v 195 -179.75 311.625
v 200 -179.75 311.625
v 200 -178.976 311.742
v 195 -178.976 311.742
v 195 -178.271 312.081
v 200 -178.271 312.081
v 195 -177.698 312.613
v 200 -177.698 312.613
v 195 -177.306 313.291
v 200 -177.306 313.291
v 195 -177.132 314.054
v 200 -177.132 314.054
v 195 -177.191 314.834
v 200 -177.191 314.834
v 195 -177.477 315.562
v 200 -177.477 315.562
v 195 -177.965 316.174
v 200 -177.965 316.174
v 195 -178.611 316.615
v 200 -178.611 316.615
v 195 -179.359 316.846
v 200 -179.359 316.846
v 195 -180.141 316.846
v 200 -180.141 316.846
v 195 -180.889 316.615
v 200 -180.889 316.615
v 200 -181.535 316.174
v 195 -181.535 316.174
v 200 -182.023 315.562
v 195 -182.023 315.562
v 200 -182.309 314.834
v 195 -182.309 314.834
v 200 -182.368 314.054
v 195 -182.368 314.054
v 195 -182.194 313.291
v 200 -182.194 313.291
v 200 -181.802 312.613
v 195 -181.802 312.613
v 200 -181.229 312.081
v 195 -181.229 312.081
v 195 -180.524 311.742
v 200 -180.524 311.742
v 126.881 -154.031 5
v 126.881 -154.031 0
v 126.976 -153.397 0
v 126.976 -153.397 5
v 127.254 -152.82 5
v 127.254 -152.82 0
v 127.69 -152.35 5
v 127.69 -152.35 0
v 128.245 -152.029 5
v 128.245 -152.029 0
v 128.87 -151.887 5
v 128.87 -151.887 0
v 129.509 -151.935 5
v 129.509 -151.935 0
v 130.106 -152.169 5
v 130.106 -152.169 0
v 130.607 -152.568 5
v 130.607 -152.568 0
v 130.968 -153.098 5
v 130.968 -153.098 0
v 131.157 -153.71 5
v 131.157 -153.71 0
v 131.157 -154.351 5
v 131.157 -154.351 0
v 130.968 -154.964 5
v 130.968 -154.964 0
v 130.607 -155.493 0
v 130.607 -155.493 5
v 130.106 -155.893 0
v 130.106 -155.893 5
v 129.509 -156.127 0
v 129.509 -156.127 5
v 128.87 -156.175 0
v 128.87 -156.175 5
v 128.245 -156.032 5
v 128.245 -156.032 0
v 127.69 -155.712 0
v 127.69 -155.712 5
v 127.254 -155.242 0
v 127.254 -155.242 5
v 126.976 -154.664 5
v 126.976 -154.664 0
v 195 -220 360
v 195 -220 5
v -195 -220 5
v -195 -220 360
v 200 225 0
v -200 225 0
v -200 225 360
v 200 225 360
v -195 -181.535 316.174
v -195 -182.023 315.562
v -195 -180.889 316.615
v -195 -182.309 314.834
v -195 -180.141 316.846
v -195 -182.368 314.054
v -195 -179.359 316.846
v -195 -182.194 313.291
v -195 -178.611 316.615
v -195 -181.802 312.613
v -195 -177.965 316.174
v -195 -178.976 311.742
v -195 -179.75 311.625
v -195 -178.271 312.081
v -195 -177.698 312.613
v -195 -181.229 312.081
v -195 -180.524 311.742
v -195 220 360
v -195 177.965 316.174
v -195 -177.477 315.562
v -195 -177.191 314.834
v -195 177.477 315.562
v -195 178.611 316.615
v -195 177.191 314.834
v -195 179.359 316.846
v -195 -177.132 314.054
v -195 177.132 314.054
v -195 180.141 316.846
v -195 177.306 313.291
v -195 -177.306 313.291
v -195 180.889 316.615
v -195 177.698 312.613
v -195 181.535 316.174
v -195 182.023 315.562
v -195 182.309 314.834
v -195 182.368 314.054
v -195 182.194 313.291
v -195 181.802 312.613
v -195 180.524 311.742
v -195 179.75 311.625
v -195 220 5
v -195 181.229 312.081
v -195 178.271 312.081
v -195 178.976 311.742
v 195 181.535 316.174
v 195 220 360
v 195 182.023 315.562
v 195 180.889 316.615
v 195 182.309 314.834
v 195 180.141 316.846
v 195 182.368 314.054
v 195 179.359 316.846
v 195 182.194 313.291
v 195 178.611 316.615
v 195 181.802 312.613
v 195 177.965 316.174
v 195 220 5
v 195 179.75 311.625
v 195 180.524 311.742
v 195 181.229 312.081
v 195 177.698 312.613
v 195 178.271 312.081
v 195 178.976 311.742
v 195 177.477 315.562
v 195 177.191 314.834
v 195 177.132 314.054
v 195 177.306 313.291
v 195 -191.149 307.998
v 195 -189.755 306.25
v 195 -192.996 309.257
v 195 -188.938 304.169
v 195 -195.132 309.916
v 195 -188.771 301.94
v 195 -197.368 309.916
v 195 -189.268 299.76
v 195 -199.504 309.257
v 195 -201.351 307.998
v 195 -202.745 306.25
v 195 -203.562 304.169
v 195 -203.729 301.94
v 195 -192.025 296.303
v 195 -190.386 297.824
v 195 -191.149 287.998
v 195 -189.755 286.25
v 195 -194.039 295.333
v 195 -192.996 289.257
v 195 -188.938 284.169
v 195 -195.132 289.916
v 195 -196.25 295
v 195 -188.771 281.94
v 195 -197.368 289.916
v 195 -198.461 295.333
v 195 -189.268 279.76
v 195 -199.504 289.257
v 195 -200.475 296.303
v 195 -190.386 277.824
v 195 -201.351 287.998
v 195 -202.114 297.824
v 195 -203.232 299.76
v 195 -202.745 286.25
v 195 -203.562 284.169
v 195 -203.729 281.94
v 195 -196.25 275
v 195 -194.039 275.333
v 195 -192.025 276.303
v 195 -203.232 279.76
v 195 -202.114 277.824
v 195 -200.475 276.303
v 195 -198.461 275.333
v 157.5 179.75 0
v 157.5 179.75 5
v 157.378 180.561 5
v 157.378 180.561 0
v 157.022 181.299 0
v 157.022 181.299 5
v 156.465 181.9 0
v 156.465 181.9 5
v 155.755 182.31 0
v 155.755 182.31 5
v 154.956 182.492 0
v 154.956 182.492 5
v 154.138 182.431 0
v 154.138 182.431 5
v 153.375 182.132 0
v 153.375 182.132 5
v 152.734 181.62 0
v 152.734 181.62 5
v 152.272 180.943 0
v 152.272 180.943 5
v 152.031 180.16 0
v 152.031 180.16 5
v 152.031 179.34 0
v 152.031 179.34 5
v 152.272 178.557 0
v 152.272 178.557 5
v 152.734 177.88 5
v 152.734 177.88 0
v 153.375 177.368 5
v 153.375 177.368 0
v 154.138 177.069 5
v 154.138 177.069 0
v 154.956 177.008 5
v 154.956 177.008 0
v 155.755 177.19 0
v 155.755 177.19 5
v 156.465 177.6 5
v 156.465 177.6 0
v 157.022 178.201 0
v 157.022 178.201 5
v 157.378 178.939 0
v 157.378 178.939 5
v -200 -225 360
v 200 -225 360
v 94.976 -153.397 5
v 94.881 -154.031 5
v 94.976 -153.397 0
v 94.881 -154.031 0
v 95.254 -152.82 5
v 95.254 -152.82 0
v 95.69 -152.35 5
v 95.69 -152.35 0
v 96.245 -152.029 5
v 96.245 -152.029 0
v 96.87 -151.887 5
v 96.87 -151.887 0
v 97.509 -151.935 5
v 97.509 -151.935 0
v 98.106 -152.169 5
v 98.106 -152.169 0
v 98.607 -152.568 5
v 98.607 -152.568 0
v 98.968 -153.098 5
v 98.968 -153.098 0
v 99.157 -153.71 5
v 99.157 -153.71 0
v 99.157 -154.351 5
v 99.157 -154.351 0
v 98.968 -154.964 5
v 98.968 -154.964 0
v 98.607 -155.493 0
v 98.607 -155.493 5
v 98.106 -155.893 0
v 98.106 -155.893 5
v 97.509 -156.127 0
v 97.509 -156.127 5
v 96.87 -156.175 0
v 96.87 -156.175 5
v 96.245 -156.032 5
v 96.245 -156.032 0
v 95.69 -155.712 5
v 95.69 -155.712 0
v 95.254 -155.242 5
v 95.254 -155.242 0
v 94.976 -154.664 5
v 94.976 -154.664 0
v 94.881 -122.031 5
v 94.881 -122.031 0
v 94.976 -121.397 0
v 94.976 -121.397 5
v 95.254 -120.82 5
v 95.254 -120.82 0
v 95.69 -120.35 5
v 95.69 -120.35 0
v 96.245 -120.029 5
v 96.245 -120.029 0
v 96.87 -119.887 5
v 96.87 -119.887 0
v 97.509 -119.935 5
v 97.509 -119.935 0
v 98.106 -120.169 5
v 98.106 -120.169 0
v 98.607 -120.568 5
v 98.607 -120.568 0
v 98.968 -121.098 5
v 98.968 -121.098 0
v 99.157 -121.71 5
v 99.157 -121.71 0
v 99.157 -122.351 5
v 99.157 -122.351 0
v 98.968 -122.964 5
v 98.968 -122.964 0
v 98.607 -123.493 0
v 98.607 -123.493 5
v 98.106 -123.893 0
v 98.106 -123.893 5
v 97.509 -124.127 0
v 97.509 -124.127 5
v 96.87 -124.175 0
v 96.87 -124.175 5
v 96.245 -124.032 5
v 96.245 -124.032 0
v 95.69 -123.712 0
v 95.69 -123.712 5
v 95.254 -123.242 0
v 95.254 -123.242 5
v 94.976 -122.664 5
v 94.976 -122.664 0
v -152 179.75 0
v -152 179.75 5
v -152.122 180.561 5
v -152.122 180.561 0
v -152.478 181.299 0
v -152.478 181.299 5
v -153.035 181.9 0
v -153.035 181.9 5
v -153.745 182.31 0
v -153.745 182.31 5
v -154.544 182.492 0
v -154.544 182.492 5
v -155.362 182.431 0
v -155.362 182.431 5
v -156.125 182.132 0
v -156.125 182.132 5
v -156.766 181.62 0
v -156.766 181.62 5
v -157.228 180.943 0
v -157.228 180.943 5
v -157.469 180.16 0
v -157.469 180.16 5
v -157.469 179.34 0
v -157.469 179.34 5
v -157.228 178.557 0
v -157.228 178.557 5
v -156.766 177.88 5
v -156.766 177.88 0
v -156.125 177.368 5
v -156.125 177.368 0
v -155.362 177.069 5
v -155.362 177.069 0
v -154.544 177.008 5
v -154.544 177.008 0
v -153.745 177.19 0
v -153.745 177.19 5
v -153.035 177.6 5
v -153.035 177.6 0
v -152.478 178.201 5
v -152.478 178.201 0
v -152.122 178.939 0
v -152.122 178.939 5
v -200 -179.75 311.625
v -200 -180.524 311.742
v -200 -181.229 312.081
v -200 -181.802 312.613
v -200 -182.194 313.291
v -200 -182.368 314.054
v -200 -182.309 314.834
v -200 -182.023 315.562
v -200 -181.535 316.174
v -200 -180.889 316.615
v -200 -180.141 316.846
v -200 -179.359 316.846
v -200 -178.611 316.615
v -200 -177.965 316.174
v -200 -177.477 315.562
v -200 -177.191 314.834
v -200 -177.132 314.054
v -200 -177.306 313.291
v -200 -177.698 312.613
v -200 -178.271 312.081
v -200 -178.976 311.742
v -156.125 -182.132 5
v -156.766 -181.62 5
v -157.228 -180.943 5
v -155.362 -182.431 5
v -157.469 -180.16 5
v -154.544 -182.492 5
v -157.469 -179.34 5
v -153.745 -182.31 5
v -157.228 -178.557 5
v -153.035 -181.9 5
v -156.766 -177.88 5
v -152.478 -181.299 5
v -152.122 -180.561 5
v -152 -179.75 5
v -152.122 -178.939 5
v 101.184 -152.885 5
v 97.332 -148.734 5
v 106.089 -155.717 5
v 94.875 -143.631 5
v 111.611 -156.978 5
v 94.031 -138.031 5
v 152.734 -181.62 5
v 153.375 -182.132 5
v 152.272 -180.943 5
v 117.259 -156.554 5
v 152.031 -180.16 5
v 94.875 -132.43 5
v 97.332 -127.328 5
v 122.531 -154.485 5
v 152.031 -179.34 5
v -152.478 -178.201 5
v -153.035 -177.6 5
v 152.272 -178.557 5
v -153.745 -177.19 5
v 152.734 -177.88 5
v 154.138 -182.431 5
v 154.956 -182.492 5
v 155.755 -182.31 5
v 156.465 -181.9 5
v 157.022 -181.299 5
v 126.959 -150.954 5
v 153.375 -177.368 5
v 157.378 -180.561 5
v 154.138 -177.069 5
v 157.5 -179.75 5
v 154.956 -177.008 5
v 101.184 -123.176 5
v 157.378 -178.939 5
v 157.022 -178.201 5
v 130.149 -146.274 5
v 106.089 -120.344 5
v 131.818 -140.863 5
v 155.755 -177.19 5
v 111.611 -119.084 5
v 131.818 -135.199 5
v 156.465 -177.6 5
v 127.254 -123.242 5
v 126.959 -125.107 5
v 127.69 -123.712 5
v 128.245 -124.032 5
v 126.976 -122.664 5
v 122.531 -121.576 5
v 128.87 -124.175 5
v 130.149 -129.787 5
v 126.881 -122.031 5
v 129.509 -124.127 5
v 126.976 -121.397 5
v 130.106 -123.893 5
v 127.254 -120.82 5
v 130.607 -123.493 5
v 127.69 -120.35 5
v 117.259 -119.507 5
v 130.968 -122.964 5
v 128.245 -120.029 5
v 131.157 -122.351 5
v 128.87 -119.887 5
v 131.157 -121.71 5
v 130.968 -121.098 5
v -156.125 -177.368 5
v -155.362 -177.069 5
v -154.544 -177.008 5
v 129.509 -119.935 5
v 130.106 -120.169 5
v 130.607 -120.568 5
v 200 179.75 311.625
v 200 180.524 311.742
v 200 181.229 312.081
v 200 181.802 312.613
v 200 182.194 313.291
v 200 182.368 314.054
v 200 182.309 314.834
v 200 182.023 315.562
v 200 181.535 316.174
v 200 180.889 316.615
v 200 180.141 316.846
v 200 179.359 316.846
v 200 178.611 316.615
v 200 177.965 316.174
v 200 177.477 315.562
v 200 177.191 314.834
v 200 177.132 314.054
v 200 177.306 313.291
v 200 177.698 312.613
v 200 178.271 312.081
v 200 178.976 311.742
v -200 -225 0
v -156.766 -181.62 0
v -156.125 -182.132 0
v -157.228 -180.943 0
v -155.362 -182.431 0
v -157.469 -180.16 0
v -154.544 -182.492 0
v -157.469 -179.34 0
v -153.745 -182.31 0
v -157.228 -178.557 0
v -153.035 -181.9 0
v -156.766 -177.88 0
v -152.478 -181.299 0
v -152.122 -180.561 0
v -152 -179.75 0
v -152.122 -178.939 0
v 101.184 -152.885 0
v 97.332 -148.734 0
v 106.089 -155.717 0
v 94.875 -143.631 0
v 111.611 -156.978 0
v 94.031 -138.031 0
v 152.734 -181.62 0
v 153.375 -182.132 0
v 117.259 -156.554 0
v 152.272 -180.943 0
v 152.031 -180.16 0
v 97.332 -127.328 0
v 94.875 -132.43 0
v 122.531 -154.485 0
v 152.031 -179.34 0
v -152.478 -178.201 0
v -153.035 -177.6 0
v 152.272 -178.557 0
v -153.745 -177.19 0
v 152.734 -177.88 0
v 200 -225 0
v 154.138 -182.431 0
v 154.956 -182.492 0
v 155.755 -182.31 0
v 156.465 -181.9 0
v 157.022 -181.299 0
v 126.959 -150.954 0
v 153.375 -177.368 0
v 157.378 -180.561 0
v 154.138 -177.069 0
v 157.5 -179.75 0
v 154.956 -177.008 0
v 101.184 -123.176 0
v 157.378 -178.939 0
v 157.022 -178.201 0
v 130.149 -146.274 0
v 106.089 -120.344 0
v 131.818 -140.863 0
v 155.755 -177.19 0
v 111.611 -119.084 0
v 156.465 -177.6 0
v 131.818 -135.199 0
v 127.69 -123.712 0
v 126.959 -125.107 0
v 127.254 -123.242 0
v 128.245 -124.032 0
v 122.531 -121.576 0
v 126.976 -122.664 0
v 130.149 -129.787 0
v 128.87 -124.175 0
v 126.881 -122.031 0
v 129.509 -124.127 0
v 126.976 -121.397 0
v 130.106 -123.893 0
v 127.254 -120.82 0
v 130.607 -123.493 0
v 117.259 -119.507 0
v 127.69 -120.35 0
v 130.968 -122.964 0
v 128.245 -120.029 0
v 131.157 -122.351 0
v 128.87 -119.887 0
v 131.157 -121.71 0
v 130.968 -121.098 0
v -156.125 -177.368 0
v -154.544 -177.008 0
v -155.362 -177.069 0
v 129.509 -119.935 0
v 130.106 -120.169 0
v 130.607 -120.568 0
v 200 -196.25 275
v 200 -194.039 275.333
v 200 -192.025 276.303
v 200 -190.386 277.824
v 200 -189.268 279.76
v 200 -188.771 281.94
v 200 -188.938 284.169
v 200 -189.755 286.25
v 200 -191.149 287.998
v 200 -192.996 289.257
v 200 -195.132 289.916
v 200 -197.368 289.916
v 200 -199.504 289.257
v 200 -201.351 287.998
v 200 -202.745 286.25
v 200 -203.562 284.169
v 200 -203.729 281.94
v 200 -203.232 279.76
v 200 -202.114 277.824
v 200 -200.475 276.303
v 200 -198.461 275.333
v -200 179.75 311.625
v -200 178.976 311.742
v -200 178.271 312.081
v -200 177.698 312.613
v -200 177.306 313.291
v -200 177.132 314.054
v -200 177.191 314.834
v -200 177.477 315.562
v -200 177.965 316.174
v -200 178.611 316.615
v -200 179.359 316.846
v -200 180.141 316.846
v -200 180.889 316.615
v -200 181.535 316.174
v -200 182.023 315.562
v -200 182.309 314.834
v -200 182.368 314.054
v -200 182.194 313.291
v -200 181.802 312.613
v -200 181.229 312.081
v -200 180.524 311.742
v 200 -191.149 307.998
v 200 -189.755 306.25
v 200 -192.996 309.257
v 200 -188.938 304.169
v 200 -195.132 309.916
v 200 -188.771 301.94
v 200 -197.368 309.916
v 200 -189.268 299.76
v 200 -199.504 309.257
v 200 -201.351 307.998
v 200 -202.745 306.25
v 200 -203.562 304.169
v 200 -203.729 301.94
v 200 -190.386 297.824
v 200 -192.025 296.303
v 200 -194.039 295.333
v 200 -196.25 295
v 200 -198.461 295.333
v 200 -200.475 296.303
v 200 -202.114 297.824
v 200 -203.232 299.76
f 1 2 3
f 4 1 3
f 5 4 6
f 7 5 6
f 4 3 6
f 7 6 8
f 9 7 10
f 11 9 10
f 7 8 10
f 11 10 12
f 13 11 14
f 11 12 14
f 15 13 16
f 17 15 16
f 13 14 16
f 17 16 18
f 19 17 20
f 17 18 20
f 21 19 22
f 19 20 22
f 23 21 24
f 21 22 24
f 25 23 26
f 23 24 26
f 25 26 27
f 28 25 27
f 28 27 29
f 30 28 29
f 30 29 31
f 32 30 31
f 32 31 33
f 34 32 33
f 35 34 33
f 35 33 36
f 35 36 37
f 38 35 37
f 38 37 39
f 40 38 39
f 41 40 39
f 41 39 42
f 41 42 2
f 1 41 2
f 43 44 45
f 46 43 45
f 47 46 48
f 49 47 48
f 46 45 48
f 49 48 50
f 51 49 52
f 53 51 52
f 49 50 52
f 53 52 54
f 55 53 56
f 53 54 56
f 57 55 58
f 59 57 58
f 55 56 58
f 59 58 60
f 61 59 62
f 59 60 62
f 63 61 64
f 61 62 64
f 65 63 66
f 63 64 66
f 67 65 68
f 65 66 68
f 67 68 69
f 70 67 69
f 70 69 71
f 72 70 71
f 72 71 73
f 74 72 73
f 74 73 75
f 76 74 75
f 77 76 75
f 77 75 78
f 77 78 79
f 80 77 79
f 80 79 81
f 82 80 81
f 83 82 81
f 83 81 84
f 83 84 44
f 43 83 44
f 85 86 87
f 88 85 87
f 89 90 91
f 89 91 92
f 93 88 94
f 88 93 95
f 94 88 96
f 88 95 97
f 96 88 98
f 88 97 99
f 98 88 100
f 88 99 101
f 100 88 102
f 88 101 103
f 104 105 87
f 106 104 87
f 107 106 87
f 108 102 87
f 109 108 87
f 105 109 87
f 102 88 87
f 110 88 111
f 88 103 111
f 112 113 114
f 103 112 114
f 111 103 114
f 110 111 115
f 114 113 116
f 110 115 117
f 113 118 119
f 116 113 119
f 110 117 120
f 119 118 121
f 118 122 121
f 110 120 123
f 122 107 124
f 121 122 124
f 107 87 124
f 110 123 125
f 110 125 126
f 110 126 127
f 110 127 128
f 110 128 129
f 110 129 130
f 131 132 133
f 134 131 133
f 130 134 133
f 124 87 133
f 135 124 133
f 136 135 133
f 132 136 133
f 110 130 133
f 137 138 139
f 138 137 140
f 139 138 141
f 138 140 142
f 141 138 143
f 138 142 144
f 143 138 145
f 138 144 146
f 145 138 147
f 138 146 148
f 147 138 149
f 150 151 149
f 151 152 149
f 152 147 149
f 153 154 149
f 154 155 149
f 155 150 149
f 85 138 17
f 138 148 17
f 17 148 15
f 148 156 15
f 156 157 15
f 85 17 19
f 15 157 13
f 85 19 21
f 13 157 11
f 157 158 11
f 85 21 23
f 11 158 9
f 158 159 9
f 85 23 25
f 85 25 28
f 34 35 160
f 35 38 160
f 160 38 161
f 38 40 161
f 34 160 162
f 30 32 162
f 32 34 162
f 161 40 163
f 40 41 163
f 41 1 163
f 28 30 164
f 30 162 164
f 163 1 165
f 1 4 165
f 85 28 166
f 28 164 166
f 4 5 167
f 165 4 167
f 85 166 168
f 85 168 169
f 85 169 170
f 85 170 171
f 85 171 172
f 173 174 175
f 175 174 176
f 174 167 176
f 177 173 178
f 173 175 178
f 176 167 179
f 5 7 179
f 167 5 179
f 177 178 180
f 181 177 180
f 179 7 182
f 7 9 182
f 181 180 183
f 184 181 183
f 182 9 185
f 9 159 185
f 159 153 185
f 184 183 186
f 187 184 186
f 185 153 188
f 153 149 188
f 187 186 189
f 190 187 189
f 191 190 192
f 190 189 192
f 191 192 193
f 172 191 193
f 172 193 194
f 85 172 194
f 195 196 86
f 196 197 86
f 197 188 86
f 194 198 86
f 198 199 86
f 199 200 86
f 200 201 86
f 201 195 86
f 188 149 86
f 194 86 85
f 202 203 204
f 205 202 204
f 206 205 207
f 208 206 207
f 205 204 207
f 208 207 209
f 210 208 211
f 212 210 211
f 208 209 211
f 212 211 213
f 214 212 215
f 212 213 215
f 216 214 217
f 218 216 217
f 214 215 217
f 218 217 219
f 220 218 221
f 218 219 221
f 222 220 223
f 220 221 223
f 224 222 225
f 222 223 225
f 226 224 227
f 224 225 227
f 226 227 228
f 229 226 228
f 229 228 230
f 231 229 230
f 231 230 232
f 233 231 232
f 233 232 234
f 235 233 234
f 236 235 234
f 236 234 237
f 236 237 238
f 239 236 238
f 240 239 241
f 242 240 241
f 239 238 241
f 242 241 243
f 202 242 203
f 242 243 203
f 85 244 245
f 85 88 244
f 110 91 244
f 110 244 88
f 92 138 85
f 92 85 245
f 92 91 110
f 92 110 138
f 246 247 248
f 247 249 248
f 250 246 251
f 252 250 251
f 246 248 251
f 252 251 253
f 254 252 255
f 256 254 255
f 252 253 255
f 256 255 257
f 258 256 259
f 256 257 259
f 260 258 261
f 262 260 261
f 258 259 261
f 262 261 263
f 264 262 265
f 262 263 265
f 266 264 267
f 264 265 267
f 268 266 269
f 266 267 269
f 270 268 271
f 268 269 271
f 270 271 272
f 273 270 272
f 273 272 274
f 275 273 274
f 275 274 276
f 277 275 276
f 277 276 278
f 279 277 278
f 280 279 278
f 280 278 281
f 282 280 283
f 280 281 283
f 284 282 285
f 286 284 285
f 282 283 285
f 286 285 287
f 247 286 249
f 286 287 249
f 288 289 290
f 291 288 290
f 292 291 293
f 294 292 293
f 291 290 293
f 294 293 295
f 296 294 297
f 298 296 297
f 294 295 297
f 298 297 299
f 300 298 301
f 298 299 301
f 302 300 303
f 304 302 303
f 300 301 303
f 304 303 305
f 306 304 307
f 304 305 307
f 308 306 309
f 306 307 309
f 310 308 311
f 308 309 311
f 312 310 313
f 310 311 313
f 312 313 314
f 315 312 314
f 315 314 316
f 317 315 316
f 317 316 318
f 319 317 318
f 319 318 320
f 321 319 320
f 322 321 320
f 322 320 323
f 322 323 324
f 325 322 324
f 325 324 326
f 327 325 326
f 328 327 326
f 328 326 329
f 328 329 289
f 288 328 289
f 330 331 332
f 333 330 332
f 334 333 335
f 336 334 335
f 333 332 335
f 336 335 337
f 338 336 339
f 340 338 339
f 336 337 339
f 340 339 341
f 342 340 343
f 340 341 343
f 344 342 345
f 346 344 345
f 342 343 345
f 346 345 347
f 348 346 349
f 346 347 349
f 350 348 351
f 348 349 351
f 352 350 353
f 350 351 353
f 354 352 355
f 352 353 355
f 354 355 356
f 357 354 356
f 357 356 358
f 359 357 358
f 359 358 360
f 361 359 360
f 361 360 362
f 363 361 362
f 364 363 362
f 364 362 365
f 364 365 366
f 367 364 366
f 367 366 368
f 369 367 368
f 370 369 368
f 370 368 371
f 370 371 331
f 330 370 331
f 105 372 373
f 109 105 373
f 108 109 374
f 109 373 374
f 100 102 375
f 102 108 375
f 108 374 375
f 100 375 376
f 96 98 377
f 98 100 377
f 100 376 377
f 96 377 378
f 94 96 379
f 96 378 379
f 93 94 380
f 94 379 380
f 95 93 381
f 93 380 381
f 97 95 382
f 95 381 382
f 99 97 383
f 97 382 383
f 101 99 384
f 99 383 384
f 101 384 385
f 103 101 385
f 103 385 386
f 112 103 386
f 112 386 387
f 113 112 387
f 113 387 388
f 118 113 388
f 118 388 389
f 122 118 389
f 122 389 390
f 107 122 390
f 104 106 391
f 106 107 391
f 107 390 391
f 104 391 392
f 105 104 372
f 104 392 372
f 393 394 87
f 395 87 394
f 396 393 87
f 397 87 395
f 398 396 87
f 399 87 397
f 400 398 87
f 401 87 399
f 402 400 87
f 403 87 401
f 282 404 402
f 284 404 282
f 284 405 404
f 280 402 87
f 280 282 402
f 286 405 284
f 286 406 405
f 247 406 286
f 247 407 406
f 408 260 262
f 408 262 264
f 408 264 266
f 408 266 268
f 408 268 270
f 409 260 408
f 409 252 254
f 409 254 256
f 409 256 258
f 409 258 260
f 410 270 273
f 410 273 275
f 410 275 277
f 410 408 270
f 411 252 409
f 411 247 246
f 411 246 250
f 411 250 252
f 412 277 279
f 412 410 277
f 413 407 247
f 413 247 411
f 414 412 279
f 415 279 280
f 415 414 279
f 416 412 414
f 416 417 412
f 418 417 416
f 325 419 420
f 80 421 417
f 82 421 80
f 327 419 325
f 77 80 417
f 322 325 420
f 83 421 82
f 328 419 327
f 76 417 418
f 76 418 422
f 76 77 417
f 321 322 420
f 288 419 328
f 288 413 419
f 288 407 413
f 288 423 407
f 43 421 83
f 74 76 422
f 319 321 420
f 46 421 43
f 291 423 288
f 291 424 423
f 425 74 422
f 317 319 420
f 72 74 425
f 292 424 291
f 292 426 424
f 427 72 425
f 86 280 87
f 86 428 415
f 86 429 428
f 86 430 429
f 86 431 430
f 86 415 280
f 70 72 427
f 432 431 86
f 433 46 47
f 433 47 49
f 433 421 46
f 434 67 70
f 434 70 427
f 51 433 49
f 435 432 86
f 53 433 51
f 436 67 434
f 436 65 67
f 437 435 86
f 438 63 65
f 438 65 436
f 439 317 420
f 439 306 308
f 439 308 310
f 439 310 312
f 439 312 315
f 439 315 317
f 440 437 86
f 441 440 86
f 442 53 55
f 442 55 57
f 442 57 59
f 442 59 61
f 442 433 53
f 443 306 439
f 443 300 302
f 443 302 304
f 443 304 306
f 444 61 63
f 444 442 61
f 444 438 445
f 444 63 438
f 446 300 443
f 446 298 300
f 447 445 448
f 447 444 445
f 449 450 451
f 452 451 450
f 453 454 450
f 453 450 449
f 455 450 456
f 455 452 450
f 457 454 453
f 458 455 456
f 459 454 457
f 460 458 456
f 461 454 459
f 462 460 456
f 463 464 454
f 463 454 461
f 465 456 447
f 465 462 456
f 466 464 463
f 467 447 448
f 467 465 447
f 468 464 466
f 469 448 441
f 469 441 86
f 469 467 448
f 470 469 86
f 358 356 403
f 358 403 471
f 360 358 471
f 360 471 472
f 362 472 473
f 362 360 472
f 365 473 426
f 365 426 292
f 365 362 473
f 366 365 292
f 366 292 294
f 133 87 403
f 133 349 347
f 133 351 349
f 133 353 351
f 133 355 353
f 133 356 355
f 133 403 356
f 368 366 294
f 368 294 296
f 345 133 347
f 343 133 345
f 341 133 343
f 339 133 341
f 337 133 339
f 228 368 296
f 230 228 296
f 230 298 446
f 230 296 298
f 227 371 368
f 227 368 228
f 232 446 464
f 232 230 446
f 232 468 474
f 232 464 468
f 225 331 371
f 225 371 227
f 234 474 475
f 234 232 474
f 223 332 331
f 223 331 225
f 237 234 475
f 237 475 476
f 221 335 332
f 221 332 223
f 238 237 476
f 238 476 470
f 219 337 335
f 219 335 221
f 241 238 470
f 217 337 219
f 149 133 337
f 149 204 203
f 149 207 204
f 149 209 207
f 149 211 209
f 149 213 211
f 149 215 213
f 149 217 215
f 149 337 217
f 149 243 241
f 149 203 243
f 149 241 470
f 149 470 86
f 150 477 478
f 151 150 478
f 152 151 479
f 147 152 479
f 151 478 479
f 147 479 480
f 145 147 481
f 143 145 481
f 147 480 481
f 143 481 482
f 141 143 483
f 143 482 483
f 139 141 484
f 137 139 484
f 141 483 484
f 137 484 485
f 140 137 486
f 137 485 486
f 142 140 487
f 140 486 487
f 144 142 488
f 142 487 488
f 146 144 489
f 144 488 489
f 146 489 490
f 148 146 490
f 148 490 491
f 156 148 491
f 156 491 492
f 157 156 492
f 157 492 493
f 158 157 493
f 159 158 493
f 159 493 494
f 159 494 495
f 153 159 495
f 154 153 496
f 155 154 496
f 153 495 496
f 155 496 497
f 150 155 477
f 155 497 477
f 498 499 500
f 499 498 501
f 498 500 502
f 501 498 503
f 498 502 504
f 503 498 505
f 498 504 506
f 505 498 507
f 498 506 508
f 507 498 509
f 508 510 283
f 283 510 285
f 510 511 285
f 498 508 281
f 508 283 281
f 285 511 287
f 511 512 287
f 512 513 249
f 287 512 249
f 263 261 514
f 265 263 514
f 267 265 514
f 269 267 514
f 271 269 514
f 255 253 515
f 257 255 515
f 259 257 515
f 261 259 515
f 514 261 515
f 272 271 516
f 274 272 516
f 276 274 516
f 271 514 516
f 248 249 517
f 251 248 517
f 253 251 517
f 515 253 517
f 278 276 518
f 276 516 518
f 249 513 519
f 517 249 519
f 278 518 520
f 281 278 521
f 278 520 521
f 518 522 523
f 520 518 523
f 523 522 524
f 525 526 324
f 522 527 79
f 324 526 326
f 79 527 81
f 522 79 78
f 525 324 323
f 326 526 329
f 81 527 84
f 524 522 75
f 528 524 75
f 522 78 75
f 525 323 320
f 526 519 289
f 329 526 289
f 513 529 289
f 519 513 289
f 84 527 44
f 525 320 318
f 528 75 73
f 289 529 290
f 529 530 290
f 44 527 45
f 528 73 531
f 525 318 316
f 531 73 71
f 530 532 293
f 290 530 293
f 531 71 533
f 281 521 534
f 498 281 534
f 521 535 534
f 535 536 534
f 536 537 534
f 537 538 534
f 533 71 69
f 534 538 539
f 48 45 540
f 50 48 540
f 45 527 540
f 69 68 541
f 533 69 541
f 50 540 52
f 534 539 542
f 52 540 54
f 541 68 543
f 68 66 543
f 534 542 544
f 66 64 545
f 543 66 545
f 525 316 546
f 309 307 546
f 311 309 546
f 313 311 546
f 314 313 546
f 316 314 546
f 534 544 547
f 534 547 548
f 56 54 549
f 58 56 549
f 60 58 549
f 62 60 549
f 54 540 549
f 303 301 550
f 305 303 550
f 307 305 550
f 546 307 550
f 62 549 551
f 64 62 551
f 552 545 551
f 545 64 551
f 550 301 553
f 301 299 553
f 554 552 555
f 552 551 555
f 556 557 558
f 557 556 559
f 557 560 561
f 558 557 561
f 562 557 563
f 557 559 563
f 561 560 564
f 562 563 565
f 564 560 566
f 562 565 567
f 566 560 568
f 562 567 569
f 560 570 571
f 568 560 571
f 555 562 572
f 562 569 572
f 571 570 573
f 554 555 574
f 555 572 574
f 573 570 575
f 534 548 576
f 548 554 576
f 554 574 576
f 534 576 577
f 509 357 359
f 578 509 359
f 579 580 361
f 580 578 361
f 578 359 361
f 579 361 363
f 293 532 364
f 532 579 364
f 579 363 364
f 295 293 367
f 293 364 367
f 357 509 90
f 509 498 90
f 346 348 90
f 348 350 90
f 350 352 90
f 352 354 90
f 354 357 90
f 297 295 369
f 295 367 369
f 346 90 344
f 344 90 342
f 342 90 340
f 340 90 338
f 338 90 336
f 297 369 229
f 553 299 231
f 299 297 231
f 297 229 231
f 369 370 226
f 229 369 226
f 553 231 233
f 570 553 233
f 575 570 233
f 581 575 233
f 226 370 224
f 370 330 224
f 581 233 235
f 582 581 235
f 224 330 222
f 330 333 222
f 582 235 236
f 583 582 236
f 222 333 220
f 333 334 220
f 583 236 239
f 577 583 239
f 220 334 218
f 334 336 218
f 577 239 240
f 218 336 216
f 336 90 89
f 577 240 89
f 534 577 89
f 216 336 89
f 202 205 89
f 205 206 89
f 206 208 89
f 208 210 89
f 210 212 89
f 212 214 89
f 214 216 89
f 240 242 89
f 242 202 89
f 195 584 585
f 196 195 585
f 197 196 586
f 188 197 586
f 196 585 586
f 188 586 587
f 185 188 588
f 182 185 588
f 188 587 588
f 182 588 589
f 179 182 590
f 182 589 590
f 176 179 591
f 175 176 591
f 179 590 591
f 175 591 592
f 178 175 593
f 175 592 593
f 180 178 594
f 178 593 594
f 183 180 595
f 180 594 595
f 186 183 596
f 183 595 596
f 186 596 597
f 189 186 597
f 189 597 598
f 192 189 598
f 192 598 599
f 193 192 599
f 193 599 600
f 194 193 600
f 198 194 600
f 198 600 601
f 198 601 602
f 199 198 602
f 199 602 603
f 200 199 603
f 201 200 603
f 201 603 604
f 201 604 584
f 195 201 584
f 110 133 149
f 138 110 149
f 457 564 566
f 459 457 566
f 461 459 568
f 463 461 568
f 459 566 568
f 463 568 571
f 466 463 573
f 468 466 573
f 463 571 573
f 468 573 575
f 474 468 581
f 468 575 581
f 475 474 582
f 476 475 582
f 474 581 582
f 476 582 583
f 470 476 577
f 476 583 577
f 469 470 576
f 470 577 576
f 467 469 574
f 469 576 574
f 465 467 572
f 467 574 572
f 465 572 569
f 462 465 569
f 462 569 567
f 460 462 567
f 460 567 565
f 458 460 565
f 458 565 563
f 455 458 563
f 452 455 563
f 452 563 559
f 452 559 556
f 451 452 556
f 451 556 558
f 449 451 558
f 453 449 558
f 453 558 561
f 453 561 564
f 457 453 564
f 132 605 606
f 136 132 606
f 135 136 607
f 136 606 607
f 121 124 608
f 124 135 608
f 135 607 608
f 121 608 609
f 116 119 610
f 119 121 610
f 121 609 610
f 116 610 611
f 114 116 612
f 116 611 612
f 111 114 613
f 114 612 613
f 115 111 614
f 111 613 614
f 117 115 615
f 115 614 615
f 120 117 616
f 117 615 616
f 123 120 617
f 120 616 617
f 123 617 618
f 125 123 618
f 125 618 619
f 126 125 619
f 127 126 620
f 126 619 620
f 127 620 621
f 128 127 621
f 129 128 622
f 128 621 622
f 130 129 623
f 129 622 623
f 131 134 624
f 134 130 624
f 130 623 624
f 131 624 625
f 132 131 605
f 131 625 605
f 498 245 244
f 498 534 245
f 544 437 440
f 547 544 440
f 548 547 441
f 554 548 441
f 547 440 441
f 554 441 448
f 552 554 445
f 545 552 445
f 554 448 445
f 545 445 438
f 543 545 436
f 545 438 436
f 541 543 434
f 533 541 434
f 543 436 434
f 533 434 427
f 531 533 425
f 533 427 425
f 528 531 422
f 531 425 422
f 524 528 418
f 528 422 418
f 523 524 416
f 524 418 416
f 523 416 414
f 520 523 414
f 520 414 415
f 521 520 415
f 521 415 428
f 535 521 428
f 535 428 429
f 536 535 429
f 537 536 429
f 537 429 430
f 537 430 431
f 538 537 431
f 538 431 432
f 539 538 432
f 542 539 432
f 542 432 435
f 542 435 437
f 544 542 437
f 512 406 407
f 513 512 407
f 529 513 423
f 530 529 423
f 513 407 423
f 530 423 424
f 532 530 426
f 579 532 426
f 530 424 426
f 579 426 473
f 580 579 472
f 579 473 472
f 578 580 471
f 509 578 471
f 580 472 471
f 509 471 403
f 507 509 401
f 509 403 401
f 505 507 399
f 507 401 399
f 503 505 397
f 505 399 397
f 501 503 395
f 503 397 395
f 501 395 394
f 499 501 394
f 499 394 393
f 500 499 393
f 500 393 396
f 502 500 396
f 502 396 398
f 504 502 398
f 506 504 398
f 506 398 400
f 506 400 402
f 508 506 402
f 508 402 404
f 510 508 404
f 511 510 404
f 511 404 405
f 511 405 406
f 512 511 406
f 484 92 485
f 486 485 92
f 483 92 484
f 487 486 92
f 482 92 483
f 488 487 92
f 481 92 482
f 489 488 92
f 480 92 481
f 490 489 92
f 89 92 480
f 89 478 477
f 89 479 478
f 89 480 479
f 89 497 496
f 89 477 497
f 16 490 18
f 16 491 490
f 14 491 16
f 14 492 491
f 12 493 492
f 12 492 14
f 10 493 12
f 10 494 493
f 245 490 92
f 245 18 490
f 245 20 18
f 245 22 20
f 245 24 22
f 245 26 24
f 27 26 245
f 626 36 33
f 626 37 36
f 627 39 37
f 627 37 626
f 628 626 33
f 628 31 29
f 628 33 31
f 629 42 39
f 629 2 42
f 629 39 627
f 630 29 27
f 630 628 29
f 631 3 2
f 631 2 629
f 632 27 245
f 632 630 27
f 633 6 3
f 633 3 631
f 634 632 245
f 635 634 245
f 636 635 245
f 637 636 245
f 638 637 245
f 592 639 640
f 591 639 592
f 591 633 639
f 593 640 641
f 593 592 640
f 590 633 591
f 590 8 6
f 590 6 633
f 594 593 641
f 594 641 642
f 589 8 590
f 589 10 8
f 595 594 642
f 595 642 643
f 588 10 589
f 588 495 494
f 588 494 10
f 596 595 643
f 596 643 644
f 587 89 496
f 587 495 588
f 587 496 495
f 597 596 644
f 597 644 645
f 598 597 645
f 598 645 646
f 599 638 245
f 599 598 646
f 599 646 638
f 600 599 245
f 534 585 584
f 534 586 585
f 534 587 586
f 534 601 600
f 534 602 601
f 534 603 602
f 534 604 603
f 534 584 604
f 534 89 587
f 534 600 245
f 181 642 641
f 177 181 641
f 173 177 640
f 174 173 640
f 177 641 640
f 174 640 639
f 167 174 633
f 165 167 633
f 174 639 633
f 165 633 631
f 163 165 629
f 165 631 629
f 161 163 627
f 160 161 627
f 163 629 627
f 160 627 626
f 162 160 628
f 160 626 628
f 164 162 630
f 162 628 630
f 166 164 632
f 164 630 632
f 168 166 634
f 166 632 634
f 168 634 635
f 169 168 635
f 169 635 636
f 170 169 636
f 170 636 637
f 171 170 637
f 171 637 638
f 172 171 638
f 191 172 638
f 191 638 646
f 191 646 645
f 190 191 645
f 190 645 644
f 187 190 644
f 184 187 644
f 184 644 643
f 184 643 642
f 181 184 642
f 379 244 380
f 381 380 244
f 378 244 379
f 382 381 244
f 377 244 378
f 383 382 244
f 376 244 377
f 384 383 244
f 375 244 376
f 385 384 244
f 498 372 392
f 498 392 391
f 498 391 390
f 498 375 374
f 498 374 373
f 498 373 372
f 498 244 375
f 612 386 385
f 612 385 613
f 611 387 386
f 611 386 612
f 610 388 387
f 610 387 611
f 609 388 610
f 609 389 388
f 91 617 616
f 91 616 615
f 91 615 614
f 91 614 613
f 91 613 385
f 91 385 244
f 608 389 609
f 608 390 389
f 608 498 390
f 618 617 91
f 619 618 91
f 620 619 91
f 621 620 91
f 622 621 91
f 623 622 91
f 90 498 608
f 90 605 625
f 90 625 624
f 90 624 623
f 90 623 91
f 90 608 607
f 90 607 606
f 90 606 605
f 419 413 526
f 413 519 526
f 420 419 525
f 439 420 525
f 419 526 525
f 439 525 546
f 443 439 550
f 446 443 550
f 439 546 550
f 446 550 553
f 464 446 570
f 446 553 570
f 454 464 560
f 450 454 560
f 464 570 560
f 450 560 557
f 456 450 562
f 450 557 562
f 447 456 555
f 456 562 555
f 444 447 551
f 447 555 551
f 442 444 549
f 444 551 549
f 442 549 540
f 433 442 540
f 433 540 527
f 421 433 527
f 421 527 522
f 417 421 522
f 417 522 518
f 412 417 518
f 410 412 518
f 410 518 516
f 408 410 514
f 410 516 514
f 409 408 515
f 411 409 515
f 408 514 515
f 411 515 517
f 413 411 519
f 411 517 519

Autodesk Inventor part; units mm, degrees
ref_plane "YZ Plane" through (0, 0, 0) normal (1, 0, 0) x (0, 1, 0)
ref_plane "XZ Plane" through (0, 0, 0) normal (0, 1, 0) x (-1, 0, 0)
ref_plane "XY Plane" through (0, 0, 0) normal (0, 0, 1) x (1, 0, 0)
sketch "Sketch2" plane through (0, 0, 0) normal (0, 0, 1) x (1, 0, 0)
  line L0 (200, -225) -> (-200, -225)
  line L1 (-200, -225) -> (-200, 225)
  line L2 (-200, 225) -> (200, 225)
  line L3 (200, 225) -> (200, -225)
  line L4 (200, -225) -> (-200, 225) construction
  line L5 (-200, -225) -> (200, 225) construction
  point P0 (0, 0)
  dimension "d0" = 400
  dimension "d1" = 450
extrude "Base" add sketch "Sketch2" along normal blind 360
shell "Shell1" thickness 5 removed faces 1 at (-66.6667, -75, 360)
sketch "Sketch4" plane through (200, -225, 0) normal (1, 0, 0) x (0, 0, -1)
  circle A0 centre (-302.5, 28.75) radius 7.5
  line L0 (-360, 0) -> (-360, 450) projected
  line L1 (0, 0) -> (-360, 0) projected
  circle A1 centre (-282.5, 28.75) radius 7.5
  point P0 (0, 225)
  dimension "d18" = 15
  dimension "d19" = 57.5
  dimension "d20" = 28.75
  dimension "d23" = 20
extrude "Cable Holes" cut sketch "Sketch4" against normal up to surface (5 mm away)
sketch "Sketch5" plane through (-195, 220, 5) normal (0, 0, 1) x (1, 0, 0)
  line L0 (349.75, -399.75) -> (40.25, -399.75) construction
  line L1 (40.25, -399.75) -> (40.25, -40.25) construction
  line L2 (40.25, -40.25) -> (349.75, -40.25) construction
  line L3 (349.75, -40.25) -> (349.75, -399.75) construction
  line L4 (349.75, -399.75) -> (40.25, -40.25) construction
  line L5 (40.25, -399.75) -> (349.75, -40.25) construction
  circle A0 centre (40.25, -40.25) radius 2.75
  circle A1 centre (349.75, -40.25) radius 2.75
  circle A2 centre (40.25, -399.75) radius 2.75
  circle A3 centre (349.75, -399.75) radius 2.75
  point P0 (195, -220)
  dimension "d30" = 309.5
  dimension "d31" = 359.5
  dimension "d32" = 5.5
  dimension "d35" = 309.5
  dimension "d38" = 359.5
extrude "Mount Holes inner walls" cut sketch "Sketch5" against normal up to surface (5 mm away)
sketch "Sketch6" plane through (200, -225, 0) normal (1, 0, 0) x (0, 0, -1)
  circle A0 centre (-314.25, 404.75) radius 2.625
  line L0 (-360, 445) -> (-360, 5) construction
  line L1 (-360, 445) -> (-360, 155) construction
  line L2 (-314.25, 404.75) -> (-314.25, 45.25) construction
  circle A1 centre (-314.25, 45.25) radius 2.625
  line L3 (-5, 5) -> (-5, 445) projected
  point P0 (0, 225)
  point P1 (-314.25, 225)
  point P2 (-360, 225)
  dimension "d43" = 5.25
  dimension "d44" = 359.5
  dimension "d46" = 5.25
  dimension "d63" = 309.25
extrude "Extrusion5" cut sketch "Sketch6" against normal up to surface (5 mm away)
mirror "Mirror2" about plane through (0, 0, 0) normal (1, 0, 0) of "Extrusion5"
sketch "Sketch7" plane through (0, 0, 0) normal (0, 0, -1) x (-1, 0, 0)
  circle A0 centre (-113.0307, -138.0307) radius 19
  circle A1 centre (-129.0307, -122.0307) radius 2.15
  line L0 (-30.7163, 0) -> (40.9179, 0) construction
  line L1 (0, 50.4838) -> (0, -80.5394) construction
  circle A2 centre (-97.0307, -122.0307) radius 2.15
  circle A3 centre (-129.0307, -154.0307) radius 2.15
  circle A4 centre (-97.0307, -154.0307) radius 2.15
  circle A5 centre (-154.75, -179.75) radius 2.75 construction
  line L2 (-154.75, -179.75) -> (-113.0307, -138.0307) construction
  line L3 (-154.75, -179.75) -> (-95.75, -179.75) construction
  line L4 (-129.0307, -122.0307) -> (-97.0307, -122.0307) construction
  line L5 (-129.0307, -154.0307) -> (-129.0307, -122.0307) construction
  point P0 (0, 0)
  point P1 (-113.0307, -122.0307)
  point P2 (-129.0307, -138.0307)
  dimension "d49" = 4.3
  dimension "d52" = 32
  dimension "d55" = 32
  dimension "d58" = 38
  dimension "d59" = 59
  dimension "d60" = 45
extrude "Fan holes" cut sketch "Sketch7" against normal up to surface (5 mm away)
equation "\"d20\" = 0.5 * d19"
equation "\"d35\" = d30"
equation "\"d38\" = d31"
equation "\"d44\" = d31"
equation "\"d46\" = d43"
equation "\"d55\" = d52"
properties part number "mouse_SP_shell"
